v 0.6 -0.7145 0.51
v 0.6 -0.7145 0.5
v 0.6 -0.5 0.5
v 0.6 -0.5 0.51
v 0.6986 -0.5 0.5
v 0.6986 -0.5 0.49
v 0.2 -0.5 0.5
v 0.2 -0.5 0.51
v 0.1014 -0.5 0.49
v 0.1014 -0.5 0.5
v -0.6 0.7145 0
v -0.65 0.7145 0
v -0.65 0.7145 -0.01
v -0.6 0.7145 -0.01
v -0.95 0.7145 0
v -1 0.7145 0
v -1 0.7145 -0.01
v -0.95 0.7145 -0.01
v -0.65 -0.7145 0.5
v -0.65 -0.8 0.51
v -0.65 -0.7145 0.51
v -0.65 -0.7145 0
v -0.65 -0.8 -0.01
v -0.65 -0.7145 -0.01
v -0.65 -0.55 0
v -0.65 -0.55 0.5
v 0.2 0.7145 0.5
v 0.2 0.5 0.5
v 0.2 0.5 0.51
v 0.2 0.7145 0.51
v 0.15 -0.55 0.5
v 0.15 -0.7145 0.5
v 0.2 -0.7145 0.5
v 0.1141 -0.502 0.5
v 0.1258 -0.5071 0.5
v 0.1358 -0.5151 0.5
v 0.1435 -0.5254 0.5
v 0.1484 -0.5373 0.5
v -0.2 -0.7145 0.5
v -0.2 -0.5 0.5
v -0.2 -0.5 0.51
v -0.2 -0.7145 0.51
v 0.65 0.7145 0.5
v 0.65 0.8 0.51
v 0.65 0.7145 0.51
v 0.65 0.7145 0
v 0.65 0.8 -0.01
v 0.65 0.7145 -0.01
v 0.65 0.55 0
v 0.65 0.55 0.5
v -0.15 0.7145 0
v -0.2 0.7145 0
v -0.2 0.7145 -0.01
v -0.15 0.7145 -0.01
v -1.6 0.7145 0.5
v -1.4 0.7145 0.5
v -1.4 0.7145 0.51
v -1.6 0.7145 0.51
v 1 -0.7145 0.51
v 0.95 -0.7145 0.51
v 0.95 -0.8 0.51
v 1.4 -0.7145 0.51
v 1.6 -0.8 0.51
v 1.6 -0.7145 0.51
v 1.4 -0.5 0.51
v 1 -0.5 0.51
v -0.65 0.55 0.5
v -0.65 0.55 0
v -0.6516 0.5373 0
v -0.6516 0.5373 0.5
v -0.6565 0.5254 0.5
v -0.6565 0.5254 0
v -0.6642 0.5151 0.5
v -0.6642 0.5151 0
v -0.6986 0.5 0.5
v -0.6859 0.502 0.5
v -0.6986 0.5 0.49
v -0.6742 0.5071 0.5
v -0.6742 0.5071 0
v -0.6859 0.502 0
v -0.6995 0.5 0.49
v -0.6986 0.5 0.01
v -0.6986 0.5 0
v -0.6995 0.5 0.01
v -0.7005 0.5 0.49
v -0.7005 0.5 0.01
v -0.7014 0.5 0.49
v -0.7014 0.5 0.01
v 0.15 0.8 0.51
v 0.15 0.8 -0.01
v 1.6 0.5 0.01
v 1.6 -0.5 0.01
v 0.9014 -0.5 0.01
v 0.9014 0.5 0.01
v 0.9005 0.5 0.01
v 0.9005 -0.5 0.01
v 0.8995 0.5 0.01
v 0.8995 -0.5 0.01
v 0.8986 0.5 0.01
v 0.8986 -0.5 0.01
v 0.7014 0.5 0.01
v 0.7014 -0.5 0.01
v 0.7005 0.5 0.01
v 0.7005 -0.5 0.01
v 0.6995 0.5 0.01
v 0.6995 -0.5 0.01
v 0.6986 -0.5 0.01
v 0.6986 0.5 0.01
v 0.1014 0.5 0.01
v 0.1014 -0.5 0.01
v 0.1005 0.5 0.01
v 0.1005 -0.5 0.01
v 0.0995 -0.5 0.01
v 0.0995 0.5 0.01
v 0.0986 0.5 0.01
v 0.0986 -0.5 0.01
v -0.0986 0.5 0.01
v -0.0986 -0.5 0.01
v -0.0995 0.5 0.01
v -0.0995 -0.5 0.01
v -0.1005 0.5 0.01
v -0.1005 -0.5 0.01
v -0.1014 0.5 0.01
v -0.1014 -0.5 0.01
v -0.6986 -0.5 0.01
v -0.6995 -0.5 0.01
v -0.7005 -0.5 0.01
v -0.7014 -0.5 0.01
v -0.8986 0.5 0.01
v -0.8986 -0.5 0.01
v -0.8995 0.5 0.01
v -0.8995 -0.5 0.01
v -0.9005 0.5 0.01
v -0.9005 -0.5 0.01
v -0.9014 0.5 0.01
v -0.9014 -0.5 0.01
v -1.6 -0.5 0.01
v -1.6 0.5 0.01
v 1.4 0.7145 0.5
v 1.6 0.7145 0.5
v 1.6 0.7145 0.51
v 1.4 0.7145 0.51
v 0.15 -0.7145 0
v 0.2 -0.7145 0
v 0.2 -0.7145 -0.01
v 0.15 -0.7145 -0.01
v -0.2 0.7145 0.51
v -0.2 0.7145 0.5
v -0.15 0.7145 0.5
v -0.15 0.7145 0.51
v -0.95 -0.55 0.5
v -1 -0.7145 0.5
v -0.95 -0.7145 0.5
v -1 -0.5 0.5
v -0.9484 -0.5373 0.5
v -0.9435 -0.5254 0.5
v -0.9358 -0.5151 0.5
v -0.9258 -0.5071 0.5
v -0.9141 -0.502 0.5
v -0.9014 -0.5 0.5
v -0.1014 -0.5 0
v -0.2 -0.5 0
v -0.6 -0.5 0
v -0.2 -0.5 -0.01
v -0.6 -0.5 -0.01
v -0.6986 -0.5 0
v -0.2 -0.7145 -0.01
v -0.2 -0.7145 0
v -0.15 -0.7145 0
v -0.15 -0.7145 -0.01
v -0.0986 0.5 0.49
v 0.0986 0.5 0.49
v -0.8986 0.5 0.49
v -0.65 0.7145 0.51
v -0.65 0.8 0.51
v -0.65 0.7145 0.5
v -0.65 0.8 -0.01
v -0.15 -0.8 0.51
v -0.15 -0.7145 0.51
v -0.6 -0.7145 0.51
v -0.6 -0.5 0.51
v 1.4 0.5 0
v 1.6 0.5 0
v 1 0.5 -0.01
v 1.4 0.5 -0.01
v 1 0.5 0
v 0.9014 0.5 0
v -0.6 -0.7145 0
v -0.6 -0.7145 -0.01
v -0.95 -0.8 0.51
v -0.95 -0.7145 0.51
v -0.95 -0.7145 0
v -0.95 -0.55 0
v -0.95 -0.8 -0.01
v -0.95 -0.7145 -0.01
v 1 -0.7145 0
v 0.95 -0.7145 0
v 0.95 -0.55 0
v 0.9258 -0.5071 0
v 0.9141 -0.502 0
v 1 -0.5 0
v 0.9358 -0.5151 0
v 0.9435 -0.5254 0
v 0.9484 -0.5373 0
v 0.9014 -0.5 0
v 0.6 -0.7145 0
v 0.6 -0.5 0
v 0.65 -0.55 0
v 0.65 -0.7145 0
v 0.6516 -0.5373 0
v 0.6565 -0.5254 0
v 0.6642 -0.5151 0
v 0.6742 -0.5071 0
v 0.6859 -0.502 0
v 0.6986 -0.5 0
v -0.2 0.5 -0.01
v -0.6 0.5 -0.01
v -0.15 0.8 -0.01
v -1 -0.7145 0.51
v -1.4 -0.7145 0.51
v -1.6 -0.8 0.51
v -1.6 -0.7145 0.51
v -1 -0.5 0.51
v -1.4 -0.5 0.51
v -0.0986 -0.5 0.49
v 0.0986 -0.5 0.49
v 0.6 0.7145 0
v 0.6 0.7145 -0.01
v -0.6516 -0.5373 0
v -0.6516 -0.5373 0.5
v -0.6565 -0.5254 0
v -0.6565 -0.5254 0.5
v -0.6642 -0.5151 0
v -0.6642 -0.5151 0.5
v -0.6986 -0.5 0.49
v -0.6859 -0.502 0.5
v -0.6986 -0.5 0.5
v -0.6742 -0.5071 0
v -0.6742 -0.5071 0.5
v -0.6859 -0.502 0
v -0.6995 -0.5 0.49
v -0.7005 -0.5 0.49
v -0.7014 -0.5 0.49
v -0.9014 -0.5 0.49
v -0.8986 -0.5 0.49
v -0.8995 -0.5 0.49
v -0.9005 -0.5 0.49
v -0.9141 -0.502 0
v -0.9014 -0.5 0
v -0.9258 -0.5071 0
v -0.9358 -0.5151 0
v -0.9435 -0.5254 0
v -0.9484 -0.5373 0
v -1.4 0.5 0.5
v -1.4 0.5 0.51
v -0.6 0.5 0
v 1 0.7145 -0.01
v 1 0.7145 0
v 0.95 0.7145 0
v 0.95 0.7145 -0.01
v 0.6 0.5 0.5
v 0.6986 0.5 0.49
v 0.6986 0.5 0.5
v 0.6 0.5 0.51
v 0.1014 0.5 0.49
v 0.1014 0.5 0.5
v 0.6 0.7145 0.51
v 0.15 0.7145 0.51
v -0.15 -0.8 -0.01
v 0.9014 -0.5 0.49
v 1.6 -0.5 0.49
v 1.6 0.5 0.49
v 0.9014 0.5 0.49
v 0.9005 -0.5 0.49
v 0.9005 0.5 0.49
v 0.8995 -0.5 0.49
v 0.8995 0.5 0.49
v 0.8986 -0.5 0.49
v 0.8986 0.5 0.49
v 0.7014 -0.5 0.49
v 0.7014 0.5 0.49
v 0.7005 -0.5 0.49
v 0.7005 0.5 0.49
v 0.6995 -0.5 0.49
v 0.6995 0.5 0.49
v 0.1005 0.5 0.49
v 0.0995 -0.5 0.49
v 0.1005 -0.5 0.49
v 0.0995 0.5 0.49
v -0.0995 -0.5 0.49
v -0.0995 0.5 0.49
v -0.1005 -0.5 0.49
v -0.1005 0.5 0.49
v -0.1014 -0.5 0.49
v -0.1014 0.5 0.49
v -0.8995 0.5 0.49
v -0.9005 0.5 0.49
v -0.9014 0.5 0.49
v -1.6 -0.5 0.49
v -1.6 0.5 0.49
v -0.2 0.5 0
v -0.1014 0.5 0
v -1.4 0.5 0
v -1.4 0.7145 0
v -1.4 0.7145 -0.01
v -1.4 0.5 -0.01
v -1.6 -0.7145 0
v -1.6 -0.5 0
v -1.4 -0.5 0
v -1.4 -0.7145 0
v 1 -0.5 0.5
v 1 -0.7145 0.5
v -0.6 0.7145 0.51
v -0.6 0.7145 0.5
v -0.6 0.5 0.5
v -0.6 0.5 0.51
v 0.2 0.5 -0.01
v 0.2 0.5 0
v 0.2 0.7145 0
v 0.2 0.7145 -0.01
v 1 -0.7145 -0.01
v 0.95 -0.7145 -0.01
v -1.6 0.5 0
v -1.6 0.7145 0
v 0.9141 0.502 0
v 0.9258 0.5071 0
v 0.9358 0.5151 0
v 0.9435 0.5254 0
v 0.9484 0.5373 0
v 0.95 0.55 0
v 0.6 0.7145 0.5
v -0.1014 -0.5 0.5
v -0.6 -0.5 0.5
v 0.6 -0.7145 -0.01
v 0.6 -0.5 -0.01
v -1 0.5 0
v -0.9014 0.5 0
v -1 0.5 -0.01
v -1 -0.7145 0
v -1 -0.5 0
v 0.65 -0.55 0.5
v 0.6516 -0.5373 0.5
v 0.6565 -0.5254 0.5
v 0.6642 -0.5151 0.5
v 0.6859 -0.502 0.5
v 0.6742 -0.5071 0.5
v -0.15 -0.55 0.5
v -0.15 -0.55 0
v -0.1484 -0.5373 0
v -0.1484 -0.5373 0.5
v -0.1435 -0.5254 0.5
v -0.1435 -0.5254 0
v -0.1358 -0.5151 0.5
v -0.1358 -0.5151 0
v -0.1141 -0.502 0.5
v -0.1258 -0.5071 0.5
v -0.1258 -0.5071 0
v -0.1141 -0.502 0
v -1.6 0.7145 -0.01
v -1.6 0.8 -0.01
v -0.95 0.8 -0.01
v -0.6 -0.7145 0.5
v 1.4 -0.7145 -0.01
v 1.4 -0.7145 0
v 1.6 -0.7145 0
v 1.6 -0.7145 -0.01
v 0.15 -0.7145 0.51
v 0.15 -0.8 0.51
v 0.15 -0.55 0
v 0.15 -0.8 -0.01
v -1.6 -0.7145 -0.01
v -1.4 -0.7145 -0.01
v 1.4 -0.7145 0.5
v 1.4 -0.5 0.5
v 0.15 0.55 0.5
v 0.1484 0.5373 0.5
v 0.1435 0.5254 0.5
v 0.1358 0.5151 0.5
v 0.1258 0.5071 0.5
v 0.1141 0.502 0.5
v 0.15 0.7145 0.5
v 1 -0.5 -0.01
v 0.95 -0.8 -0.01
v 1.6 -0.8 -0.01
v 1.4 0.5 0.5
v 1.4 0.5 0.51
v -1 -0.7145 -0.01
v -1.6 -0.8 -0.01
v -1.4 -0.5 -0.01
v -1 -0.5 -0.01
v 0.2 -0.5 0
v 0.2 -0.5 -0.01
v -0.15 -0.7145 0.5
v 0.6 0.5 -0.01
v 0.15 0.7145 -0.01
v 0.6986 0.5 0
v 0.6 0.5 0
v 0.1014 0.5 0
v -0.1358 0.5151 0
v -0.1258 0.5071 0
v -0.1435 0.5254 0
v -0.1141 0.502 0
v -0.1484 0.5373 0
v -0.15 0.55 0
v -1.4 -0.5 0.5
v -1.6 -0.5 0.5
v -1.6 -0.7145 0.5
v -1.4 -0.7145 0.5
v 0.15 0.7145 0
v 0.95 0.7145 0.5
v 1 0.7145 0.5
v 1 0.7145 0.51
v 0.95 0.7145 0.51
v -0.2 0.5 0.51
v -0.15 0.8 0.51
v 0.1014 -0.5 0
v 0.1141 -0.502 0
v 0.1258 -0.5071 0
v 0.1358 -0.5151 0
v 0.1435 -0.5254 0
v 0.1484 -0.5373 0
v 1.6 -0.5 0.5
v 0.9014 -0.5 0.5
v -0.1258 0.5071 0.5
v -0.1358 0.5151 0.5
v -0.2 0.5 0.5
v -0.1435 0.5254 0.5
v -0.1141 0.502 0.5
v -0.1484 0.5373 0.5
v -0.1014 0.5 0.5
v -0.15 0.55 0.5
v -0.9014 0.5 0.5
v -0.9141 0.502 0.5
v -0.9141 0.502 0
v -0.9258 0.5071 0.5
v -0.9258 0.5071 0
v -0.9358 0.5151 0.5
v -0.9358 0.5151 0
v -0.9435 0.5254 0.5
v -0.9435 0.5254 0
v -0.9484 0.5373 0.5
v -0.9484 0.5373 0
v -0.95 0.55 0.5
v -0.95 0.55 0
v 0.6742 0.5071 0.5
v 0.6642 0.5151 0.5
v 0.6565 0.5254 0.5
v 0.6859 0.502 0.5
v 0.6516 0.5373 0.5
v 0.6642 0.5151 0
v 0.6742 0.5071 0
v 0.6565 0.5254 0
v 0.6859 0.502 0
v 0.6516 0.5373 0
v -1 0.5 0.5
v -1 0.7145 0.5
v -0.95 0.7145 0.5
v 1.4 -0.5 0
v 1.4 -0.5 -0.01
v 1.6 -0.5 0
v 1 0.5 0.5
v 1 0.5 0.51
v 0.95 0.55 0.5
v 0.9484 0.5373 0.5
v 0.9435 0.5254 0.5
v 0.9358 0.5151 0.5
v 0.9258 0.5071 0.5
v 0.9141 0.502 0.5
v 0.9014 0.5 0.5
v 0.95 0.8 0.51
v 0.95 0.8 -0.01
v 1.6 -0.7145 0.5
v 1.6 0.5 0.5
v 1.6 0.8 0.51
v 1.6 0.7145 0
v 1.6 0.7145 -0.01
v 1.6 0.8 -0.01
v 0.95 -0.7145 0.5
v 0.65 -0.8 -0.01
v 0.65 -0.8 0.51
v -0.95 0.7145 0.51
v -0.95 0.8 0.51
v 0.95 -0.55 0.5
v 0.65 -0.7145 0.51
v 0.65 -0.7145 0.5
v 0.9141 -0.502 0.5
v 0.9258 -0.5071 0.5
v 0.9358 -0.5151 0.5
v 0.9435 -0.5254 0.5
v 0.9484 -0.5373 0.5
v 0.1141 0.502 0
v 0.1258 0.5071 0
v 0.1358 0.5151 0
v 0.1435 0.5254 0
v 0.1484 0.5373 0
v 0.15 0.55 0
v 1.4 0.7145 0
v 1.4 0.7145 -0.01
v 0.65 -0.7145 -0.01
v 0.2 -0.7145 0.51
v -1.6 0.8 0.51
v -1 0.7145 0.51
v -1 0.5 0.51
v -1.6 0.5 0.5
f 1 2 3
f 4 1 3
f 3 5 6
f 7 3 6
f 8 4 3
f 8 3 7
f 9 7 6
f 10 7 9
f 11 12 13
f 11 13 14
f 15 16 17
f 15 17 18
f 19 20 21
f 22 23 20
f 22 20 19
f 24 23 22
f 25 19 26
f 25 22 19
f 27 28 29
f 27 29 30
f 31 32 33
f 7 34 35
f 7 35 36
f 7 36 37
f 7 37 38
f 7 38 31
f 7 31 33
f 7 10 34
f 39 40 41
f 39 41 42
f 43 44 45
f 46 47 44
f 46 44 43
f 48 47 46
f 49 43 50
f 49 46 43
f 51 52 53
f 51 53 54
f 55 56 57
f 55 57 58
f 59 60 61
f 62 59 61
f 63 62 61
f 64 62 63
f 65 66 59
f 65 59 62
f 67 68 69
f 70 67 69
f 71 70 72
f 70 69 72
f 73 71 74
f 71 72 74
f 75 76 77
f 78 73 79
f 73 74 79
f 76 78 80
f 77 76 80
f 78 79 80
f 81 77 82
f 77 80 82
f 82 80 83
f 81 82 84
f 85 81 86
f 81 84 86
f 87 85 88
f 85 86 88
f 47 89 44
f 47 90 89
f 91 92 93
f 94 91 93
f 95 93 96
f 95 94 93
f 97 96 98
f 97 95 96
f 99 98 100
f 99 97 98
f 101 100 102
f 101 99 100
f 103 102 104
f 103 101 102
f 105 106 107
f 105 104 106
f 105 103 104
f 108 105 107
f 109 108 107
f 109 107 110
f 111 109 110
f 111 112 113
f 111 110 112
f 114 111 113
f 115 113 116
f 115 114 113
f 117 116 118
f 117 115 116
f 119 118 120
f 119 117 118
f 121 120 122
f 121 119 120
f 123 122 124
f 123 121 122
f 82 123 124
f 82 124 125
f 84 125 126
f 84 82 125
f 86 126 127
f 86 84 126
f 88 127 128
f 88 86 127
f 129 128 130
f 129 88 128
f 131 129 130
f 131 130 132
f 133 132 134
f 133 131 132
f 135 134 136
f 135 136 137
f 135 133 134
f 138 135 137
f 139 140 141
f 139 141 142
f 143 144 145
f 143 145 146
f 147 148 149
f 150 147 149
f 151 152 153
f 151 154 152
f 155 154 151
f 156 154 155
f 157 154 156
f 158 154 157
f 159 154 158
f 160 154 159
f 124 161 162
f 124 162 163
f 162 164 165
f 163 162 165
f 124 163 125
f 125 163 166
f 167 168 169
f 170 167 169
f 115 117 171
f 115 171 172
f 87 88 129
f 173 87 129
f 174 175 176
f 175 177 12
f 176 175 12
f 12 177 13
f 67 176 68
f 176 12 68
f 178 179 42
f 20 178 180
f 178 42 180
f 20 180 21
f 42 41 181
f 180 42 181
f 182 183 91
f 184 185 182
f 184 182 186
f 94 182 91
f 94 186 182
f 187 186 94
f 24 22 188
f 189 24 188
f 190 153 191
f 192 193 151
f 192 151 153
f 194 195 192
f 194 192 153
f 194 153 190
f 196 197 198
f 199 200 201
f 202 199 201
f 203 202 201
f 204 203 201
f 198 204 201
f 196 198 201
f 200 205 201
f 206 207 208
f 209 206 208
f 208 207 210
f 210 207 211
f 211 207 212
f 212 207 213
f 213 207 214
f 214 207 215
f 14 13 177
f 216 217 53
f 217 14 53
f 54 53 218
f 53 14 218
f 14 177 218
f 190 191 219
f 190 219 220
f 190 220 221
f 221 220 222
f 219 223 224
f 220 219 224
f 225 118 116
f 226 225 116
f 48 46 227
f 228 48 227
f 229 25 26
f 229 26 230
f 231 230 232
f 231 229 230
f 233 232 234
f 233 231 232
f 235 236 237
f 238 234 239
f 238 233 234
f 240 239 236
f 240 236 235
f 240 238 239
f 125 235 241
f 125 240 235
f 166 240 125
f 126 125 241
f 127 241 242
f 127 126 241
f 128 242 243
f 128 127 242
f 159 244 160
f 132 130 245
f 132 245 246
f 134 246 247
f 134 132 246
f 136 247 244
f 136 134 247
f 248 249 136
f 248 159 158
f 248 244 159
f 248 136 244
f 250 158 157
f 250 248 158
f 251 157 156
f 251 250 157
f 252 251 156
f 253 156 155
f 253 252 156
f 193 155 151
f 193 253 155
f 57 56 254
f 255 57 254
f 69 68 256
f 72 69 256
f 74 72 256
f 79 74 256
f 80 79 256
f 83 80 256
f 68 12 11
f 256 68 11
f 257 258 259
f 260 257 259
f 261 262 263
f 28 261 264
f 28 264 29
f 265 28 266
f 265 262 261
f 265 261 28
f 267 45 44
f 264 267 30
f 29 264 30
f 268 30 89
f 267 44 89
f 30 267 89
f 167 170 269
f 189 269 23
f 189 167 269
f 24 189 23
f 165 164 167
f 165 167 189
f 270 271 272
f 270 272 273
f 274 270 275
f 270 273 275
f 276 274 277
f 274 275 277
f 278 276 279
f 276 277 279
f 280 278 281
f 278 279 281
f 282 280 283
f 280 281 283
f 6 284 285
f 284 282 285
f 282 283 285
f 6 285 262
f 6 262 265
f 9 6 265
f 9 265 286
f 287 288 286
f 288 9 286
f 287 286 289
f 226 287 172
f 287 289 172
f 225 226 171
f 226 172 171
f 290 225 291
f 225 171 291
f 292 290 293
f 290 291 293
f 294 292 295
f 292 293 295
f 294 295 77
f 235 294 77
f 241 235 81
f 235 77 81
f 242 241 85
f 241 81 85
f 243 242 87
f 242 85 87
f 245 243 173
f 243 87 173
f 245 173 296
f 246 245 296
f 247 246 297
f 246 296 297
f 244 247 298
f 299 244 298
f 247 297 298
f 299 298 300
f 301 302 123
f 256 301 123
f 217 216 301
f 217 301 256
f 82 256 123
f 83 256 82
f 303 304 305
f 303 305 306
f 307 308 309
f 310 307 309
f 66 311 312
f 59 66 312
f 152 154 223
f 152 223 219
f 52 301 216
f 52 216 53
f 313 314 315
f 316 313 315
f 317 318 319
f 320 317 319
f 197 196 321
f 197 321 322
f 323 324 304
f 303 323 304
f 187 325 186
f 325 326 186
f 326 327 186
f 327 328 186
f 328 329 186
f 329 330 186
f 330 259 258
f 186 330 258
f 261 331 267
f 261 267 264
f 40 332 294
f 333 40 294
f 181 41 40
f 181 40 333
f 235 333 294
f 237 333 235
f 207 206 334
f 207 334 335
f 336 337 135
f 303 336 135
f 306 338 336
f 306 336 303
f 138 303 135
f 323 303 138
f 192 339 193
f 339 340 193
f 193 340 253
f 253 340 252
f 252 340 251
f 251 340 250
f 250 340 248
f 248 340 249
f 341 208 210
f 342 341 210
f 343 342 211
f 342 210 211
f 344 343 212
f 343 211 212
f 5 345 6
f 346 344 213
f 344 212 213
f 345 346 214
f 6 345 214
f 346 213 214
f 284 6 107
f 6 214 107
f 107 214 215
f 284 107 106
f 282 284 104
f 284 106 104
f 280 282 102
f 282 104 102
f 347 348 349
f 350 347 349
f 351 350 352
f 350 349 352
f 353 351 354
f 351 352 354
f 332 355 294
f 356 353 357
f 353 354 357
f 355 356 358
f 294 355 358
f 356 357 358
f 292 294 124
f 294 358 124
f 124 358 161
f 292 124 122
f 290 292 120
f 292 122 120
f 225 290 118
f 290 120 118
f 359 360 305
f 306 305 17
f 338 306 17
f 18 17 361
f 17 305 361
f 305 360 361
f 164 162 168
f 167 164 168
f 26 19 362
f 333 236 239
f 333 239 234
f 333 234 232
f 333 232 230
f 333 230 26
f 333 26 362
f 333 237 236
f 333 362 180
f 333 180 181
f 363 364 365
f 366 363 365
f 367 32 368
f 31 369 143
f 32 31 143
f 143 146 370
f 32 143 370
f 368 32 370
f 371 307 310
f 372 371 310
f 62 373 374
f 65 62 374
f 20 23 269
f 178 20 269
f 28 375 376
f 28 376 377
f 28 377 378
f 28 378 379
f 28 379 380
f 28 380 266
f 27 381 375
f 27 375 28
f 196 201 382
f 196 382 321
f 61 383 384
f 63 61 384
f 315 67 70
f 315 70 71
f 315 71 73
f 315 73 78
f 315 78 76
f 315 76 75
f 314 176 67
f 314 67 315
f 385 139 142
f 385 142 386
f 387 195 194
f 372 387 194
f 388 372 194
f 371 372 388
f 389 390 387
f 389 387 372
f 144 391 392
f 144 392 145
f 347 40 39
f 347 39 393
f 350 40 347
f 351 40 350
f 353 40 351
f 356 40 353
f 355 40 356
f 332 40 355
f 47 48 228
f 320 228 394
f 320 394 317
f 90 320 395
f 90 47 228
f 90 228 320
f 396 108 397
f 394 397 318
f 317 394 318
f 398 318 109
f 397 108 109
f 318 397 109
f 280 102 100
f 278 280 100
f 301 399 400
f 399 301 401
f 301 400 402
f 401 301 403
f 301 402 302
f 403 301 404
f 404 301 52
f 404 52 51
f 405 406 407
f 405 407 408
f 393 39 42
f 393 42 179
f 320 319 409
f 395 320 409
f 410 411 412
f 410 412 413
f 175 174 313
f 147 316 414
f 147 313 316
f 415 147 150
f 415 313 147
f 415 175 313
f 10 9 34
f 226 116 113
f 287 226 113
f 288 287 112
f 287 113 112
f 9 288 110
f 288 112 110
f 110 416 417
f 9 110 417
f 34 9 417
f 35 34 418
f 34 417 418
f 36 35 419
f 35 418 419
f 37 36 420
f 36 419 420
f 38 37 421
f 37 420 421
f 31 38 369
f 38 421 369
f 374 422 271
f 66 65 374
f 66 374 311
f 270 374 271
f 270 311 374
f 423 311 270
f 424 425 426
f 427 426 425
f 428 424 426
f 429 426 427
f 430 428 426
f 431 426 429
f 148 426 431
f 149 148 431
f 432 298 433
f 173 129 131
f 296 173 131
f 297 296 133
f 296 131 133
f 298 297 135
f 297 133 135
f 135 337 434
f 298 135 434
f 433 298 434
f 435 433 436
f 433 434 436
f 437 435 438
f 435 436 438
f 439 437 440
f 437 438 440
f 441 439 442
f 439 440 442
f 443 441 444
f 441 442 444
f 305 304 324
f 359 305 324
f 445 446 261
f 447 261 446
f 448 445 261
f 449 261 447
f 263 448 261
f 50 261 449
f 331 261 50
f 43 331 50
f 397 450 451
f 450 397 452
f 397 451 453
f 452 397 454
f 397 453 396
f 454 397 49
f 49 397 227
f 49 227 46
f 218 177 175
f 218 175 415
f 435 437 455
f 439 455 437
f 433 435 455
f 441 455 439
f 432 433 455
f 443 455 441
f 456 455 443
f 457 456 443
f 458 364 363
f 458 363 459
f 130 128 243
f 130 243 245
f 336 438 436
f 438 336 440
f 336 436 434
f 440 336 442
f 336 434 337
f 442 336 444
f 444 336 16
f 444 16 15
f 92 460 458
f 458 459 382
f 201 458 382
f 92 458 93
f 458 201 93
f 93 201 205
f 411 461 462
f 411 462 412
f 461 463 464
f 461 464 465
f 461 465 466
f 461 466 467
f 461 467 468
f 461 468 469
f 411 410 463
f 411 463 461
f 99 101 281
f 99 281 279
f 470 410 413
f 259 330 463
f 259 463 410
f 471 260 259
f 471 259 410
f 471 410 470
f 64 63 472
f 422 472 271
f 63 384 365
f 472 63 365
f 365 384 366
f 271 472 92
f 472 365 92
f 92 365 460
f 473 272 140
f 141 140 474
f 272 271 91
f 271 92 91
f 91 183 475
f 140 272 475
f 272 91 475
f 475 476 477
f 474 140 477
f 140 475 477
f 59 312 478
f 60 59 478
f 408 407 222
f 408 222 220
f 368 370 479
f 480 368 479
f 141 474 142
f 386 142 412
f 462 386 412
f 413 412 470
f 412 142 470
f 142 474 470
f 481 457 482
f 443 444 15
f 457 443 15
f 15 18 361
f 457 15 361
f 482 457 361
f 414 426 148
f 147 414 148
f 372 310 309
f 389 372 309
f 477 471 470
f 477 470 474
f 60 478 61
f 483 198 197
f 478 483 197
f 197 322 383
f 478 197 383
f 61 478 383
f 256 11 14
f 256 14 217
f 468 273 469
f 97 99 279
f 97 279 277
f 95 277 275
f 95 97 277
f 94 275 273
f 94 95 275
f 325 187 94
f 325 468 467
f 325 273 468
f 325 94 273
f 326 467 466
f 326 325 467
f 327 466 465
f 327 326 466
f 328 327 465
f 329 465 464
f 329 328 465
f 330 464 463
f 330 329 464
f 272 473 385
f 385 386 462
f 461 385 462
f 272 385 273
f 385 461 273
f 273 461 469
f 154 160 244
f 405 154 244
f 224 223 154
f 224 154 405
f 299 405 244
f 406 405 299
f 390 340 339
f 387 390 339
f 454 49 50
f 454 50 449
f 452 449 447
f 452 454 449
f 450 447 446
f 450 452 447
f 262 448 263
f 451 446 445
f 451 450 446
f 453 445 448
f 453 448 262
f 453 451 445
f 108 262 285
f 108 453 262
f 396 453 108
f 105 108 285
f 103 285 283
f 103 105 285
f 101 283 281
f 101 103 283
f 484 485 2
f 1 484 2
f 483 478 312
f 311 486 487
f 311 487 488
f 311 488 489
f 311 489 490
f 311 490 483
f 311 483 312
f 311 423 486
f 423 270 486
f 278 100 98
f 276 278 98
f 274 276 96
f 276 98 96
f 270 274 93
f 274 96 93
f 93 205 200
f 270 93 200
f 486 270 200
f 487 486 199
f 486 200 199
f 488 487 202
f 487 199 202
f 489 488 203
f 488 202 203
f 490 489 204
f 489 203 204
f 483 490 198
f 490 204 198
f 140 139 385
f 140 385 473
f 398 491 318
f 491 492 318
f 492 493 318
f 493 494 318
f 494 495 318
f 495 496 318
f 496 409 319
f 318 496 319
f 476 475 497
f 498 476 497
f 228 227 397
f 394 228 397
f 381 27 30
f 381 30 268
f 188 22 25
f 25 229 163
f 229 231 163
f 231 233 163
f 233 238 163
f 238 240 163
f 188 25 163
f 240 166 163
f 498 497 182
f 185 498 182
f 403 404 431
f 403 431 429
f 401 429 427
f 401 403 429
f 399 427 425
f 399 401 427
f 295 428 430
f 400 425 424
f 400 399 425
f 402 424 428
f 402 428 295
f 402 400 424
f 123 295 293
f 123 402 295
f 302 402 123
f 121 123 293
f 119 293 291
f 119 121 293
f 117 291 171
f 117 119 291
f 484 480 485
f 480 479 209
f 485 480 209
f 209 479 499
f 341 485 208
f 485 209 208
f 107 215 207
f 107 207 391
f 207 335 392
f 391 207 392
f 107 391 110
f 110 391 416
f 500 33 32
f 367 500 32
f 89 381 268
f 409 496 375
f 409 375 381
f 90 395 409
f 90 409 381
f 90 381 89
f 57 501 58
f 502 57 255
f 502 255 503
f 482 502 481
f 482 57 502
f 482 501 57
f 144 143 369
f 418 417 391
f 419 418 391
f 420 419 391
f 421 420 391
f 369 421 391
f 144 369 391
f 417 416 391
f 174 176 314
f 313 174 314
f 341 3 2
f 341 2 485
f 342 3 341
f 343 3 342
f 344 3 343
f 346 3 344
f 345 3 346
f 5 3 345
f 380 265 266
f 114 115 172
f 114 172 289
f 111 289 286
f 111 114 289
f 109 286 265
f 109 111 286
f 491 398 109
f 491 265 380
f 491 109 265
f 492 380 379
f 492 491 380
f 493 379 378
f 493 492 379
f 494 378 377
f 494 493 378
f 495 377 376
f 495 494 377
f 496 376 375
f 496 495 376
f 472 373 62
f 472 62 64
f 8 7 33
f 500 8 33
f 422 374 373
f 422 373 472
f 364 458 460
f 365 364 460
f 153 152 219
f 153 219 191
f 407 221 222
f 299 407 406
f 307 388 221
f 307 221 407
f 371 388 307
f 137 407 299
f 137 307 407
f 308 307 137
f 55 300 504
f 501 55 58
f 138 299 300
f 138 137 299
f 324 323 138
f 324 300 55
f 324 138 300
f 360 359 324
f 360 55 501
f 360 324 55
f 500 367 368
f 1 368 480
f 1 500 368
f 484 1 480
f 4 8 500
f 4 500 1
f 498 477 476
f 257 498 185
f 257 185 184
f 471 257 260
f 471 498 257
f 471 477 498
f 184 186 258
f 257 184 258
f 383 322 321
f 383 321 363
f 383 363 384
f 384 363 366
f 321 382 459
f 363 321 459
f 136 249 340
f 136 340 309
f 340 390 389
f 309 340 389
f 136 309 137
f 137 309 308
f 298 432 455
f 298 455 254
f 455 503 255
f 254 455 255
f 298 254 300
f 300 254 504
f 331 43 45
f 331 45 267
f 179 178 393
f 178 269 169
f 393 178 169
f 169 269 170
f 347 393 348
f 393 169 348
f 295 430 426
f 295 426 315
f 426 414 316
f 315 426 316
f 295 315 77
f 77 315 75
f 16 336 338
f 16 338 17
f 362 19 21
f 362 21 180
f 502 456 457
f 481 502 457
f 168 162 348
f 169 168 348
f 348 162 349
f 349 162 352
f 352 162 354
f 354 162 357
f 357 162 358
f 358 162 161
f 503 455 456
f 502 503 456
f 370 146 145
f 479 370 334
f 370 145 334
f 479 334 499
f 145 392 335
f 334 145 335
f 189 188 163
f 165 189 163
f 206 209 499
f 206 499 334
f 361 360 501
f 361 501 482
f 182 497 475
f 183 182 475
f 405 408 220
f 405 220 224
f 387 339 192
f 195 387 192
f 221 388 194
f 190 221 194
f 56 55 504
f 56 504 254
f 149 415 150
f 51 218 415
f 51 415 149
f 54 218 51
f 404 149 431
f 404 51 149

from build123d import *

# Parameters (mm, degrees)
SKETCH1_W           = 3.2
SKETCH1_H           = 1.6
BOSS_EXTRUDE1_DEPTH = 0.5
CUT_EXTRUDE1_DEPTH  = 1.5
SKETCH3_W           = 3.2
SKETCH3_H           = 1
CUT_EXTRUDE2_DEPTH  = 0.01
BOSS_EXTRUDE2_DEPTH = 0.01


with BuildPart() as part:
    # Sketch1 → Boss-Extrude1 (new body)
    with BuildSketch(Plane.XY):
        Rectangle(SKETCH1_W, SKETCH1_H)
    extrude(amount=BOSS_EXTRUDE1_DEPTH)

    # Sketch2 → Cut-Extrude1 (cut, through all)
    with BuildSketch(Plane(origin=(0, 0, 0), x_dir=(-1, 0, 0), z_dir=(0, 0, -1))):
        with BuildLine():
            Line((-0.15, 0.8), (0.15, 0.8))
            Line((0.15, 0.8), (0.15, 0.549979938))
            ThreePointArc((0.15, 0.549979938), (0.134862042, 0.514138446), (0.098614632, 0.5))
            Line((0.098614632, 0.5), (-0.098614632, 0.5))
            ThreePointArc((-0.098614632, 0.5), (-0.134862042, 0.514138446), (-0.15, 0.549979938))
            Line((-0.15, 0.549979938), (-0.15, 0.8))
        make_face()
        with BuildLine():
            Line((-0.65, 0.8), (-0.65, 0.549979938))
            ThreePointArc((-0.65, 0.549979938), (-0.665137958, 0.514138446), (-0.701385368, 0.5))
            Line((-0.701385368, 0.5), (-0.898614632, 0.5))
            ThreePointArc((-0.898614632, 0.5), (-0.934862042, 0.514138446), (-0.95, 0.549979938))
            Line((-0.95, 0.549979938), (-0.95, 0.8))
            Line((-0.95, 0.8), (-0.65, 0.8))
        make_face()
        with BuildLine():
            Line((0.95, 0.8), (0.65, 0.8))
            Line((0.65, 0.8), (0.65, 0.549979938))
            ThreePointArc((0.65, 0.549979938), (0.665137958, 0.514138446), (0.701385368, 0.5))
            Line((0.701385368, 0.5), (0.898614632, 0.5))
            ThreePointArc((0.898614632, 0.5), (0.934862042, 0.514138446), (0.95, 0.549979938))
            Line((0.95, 0.549979938), (0.95, 0.8))
        make_face()
        with BuildLine():
            Line((0.65, -0.8), (0.65, -0.549979938))
            ThreePointArc((0.65, -0.549979938), (0.665137958, -0.514138446), (0.701385368, -0.5))
            Line((0.701385368, -0.5), (0.898614632, -0.5))
            ThreePointArc((0.898614632, -0.5), (0.934862042, -0.514138446), (0.95, -0.549979938))
            Line((0.95, -0.549979938), (0.95, -0.8))
            Line((0.95, -0.8), (0.65, -0.8))
        make_face()
        with BuildLine():
            Line((0.15, -0.8), (0.15, -0.549979938))
            ThreePointArc((0.15, -0.549979938), (0.134862042, -0.514138446), (0.098614632, -0.5))
            Line((0.098614632, -0.5), (-0.098614632, -0.5))
            ThreePointArc((-0.098614632, -0.5), (-0.134862042, -0.514138446), (-0.15, -0.549979938))
            Line((-0.15, -0.549979938), (-0.15, -0.8))
            Line((-0.15, -0.8), (0.15, -0.8))
        make_face()
        with BuildLine():
            Line((-0.95, -0.8), (-0.65, -0.8))
            Line((-0.65, -0.8), (-0.65, -0.549979938))
            ThreePointArc((-0.65, -0.549979938), (-0.665137958, -0.514138446), (-0.701385368, -0.5))
            Line((-0.701385368, -0.5), (-0.898614632, -0.5))
            ThreePointArc((-0.898614632, -0.5), (-0.934862042, -0.514138446), (-0.95, -0.549979938))
            Line((-0.95, -0.549979938), (-0.95, -0.8))
        make_face()
    extrude(amount=-CUT_EXTRUDE1_DEPTH, mode=Mode.SUBTRACT)

    # Sketch3 → Cut-Extrude2 (cut)
    with BuildSketch(Plane(origin=(0, 0, 0), x_dir=(-1, 0, 0), z_dir=(0, 0, -1))):
        Rectangle(SKETCH3_W, SKETCH3_H)
    cut_extrude2 = extrude(amount=-CUT_EXTRUDE2_DEPTH, mode=Mode.SUBTRACT)

    # Mirror1: Cut-Extrude2 across plane
    add(cut_extrude2.mirror(Plane(origin=(0, 0, 0.25), x_dir=(1, 0, 0), z_dir=(0, 0, -1))), mode=Mode.SUBTRACT)

    # Sketch4 → Boss-Extrude2 (add)
    with BuildSketch(Plane(origin=(0, 0, 0), x_dir=(-1, 0, 0), z_dir=(0, 0, -1))):
        Polygon((-0.65, 0.71450836), (-0.6, 0.71450836), (-0.6, 0.5), (-0.2, 0.5), (-0.2, 0.71450836), (-0.15, 0.71450836), (-0.15, 0.8), (-0.65, 0.8), align=None)
        Polygon((-1.45, 0.71450836), (-1.4, 0.71450836), (-1.4, 0.5), (-1, 0.5), (-1, 0.71450836), (-0.95, 0.71450836), (-0.95, 0.8), (-1.45, 0.8), (-1.6, 0.8), (-1.6, 0.71450836), align=None)
        Polygon((1.6, 0.8), (1.6, 0.71450836), (1.45, 0.71450836), (1.4, 0.71450836), (1.4, 0.5), (1, 0.5), (1, 0.71450836), (0.95, 0.71450836), (0.95, 0.8), (1.45, 0.8), align=None)
        Polygon((0.6, 0.5), (0.2, 0.5), (0.2, 0.71450836), (0.15, 0.71450836), (0.15, 0.8), (0.65, 0.8), (0.65, 0.71450836), (0.6, 0.71450836), align=None)
        Polygon((1.45, -0.71450836), (1.4, -0.71450836), (1.4, -0.5), (1, -0.5), (1, -0.71450836), (0.95, -0.71450836), (0.95, -0.8), (1.45, -0.8), (1.6, -0.8), (1.6, -0.71450836), align=None)
        Polygon((-1.6, -0.8), (-1.6, -0.71450836), (-1.45, -0.71450836), (-1.4, -0.71450836), (-1.4, -0.5), (-1, -0.5), (-1, -0.71450836), (-0.95, -0.71450836), (-0.95, -0.8), (-1.45, -0.8), align=None)
        Polygon((0.65, -0.71450836), (0.6, -0.71450836), (0.6, -0.5), (0.2, -0.5), (0.2, -0.71450836), (0.15, -0.71450836), (0.15, -0.8), (0.65, -0.8), align=None)
        Polygon((-0.6, -0.5), (-0.2, -0.5), (-0.2, -0.71450836), (-0.15, -0.71450836), (-0.15, -0.8), (-0.65, -0.8), (-0.65, -0.71450836), (-0.6, -0.71450836), align=None)
    boss_extrude2 = extrude(amount=BOSS_EXTRUDE2_DEPTH)

    # Mirror2: Boss-Extrude2 across plane
    add(boss_extrude2.mirror(Plane(origin=(0, 0, 0.25), x_dir=(1, 0, 0), z_dir=(0, 0, -1))))


solid = part.part
